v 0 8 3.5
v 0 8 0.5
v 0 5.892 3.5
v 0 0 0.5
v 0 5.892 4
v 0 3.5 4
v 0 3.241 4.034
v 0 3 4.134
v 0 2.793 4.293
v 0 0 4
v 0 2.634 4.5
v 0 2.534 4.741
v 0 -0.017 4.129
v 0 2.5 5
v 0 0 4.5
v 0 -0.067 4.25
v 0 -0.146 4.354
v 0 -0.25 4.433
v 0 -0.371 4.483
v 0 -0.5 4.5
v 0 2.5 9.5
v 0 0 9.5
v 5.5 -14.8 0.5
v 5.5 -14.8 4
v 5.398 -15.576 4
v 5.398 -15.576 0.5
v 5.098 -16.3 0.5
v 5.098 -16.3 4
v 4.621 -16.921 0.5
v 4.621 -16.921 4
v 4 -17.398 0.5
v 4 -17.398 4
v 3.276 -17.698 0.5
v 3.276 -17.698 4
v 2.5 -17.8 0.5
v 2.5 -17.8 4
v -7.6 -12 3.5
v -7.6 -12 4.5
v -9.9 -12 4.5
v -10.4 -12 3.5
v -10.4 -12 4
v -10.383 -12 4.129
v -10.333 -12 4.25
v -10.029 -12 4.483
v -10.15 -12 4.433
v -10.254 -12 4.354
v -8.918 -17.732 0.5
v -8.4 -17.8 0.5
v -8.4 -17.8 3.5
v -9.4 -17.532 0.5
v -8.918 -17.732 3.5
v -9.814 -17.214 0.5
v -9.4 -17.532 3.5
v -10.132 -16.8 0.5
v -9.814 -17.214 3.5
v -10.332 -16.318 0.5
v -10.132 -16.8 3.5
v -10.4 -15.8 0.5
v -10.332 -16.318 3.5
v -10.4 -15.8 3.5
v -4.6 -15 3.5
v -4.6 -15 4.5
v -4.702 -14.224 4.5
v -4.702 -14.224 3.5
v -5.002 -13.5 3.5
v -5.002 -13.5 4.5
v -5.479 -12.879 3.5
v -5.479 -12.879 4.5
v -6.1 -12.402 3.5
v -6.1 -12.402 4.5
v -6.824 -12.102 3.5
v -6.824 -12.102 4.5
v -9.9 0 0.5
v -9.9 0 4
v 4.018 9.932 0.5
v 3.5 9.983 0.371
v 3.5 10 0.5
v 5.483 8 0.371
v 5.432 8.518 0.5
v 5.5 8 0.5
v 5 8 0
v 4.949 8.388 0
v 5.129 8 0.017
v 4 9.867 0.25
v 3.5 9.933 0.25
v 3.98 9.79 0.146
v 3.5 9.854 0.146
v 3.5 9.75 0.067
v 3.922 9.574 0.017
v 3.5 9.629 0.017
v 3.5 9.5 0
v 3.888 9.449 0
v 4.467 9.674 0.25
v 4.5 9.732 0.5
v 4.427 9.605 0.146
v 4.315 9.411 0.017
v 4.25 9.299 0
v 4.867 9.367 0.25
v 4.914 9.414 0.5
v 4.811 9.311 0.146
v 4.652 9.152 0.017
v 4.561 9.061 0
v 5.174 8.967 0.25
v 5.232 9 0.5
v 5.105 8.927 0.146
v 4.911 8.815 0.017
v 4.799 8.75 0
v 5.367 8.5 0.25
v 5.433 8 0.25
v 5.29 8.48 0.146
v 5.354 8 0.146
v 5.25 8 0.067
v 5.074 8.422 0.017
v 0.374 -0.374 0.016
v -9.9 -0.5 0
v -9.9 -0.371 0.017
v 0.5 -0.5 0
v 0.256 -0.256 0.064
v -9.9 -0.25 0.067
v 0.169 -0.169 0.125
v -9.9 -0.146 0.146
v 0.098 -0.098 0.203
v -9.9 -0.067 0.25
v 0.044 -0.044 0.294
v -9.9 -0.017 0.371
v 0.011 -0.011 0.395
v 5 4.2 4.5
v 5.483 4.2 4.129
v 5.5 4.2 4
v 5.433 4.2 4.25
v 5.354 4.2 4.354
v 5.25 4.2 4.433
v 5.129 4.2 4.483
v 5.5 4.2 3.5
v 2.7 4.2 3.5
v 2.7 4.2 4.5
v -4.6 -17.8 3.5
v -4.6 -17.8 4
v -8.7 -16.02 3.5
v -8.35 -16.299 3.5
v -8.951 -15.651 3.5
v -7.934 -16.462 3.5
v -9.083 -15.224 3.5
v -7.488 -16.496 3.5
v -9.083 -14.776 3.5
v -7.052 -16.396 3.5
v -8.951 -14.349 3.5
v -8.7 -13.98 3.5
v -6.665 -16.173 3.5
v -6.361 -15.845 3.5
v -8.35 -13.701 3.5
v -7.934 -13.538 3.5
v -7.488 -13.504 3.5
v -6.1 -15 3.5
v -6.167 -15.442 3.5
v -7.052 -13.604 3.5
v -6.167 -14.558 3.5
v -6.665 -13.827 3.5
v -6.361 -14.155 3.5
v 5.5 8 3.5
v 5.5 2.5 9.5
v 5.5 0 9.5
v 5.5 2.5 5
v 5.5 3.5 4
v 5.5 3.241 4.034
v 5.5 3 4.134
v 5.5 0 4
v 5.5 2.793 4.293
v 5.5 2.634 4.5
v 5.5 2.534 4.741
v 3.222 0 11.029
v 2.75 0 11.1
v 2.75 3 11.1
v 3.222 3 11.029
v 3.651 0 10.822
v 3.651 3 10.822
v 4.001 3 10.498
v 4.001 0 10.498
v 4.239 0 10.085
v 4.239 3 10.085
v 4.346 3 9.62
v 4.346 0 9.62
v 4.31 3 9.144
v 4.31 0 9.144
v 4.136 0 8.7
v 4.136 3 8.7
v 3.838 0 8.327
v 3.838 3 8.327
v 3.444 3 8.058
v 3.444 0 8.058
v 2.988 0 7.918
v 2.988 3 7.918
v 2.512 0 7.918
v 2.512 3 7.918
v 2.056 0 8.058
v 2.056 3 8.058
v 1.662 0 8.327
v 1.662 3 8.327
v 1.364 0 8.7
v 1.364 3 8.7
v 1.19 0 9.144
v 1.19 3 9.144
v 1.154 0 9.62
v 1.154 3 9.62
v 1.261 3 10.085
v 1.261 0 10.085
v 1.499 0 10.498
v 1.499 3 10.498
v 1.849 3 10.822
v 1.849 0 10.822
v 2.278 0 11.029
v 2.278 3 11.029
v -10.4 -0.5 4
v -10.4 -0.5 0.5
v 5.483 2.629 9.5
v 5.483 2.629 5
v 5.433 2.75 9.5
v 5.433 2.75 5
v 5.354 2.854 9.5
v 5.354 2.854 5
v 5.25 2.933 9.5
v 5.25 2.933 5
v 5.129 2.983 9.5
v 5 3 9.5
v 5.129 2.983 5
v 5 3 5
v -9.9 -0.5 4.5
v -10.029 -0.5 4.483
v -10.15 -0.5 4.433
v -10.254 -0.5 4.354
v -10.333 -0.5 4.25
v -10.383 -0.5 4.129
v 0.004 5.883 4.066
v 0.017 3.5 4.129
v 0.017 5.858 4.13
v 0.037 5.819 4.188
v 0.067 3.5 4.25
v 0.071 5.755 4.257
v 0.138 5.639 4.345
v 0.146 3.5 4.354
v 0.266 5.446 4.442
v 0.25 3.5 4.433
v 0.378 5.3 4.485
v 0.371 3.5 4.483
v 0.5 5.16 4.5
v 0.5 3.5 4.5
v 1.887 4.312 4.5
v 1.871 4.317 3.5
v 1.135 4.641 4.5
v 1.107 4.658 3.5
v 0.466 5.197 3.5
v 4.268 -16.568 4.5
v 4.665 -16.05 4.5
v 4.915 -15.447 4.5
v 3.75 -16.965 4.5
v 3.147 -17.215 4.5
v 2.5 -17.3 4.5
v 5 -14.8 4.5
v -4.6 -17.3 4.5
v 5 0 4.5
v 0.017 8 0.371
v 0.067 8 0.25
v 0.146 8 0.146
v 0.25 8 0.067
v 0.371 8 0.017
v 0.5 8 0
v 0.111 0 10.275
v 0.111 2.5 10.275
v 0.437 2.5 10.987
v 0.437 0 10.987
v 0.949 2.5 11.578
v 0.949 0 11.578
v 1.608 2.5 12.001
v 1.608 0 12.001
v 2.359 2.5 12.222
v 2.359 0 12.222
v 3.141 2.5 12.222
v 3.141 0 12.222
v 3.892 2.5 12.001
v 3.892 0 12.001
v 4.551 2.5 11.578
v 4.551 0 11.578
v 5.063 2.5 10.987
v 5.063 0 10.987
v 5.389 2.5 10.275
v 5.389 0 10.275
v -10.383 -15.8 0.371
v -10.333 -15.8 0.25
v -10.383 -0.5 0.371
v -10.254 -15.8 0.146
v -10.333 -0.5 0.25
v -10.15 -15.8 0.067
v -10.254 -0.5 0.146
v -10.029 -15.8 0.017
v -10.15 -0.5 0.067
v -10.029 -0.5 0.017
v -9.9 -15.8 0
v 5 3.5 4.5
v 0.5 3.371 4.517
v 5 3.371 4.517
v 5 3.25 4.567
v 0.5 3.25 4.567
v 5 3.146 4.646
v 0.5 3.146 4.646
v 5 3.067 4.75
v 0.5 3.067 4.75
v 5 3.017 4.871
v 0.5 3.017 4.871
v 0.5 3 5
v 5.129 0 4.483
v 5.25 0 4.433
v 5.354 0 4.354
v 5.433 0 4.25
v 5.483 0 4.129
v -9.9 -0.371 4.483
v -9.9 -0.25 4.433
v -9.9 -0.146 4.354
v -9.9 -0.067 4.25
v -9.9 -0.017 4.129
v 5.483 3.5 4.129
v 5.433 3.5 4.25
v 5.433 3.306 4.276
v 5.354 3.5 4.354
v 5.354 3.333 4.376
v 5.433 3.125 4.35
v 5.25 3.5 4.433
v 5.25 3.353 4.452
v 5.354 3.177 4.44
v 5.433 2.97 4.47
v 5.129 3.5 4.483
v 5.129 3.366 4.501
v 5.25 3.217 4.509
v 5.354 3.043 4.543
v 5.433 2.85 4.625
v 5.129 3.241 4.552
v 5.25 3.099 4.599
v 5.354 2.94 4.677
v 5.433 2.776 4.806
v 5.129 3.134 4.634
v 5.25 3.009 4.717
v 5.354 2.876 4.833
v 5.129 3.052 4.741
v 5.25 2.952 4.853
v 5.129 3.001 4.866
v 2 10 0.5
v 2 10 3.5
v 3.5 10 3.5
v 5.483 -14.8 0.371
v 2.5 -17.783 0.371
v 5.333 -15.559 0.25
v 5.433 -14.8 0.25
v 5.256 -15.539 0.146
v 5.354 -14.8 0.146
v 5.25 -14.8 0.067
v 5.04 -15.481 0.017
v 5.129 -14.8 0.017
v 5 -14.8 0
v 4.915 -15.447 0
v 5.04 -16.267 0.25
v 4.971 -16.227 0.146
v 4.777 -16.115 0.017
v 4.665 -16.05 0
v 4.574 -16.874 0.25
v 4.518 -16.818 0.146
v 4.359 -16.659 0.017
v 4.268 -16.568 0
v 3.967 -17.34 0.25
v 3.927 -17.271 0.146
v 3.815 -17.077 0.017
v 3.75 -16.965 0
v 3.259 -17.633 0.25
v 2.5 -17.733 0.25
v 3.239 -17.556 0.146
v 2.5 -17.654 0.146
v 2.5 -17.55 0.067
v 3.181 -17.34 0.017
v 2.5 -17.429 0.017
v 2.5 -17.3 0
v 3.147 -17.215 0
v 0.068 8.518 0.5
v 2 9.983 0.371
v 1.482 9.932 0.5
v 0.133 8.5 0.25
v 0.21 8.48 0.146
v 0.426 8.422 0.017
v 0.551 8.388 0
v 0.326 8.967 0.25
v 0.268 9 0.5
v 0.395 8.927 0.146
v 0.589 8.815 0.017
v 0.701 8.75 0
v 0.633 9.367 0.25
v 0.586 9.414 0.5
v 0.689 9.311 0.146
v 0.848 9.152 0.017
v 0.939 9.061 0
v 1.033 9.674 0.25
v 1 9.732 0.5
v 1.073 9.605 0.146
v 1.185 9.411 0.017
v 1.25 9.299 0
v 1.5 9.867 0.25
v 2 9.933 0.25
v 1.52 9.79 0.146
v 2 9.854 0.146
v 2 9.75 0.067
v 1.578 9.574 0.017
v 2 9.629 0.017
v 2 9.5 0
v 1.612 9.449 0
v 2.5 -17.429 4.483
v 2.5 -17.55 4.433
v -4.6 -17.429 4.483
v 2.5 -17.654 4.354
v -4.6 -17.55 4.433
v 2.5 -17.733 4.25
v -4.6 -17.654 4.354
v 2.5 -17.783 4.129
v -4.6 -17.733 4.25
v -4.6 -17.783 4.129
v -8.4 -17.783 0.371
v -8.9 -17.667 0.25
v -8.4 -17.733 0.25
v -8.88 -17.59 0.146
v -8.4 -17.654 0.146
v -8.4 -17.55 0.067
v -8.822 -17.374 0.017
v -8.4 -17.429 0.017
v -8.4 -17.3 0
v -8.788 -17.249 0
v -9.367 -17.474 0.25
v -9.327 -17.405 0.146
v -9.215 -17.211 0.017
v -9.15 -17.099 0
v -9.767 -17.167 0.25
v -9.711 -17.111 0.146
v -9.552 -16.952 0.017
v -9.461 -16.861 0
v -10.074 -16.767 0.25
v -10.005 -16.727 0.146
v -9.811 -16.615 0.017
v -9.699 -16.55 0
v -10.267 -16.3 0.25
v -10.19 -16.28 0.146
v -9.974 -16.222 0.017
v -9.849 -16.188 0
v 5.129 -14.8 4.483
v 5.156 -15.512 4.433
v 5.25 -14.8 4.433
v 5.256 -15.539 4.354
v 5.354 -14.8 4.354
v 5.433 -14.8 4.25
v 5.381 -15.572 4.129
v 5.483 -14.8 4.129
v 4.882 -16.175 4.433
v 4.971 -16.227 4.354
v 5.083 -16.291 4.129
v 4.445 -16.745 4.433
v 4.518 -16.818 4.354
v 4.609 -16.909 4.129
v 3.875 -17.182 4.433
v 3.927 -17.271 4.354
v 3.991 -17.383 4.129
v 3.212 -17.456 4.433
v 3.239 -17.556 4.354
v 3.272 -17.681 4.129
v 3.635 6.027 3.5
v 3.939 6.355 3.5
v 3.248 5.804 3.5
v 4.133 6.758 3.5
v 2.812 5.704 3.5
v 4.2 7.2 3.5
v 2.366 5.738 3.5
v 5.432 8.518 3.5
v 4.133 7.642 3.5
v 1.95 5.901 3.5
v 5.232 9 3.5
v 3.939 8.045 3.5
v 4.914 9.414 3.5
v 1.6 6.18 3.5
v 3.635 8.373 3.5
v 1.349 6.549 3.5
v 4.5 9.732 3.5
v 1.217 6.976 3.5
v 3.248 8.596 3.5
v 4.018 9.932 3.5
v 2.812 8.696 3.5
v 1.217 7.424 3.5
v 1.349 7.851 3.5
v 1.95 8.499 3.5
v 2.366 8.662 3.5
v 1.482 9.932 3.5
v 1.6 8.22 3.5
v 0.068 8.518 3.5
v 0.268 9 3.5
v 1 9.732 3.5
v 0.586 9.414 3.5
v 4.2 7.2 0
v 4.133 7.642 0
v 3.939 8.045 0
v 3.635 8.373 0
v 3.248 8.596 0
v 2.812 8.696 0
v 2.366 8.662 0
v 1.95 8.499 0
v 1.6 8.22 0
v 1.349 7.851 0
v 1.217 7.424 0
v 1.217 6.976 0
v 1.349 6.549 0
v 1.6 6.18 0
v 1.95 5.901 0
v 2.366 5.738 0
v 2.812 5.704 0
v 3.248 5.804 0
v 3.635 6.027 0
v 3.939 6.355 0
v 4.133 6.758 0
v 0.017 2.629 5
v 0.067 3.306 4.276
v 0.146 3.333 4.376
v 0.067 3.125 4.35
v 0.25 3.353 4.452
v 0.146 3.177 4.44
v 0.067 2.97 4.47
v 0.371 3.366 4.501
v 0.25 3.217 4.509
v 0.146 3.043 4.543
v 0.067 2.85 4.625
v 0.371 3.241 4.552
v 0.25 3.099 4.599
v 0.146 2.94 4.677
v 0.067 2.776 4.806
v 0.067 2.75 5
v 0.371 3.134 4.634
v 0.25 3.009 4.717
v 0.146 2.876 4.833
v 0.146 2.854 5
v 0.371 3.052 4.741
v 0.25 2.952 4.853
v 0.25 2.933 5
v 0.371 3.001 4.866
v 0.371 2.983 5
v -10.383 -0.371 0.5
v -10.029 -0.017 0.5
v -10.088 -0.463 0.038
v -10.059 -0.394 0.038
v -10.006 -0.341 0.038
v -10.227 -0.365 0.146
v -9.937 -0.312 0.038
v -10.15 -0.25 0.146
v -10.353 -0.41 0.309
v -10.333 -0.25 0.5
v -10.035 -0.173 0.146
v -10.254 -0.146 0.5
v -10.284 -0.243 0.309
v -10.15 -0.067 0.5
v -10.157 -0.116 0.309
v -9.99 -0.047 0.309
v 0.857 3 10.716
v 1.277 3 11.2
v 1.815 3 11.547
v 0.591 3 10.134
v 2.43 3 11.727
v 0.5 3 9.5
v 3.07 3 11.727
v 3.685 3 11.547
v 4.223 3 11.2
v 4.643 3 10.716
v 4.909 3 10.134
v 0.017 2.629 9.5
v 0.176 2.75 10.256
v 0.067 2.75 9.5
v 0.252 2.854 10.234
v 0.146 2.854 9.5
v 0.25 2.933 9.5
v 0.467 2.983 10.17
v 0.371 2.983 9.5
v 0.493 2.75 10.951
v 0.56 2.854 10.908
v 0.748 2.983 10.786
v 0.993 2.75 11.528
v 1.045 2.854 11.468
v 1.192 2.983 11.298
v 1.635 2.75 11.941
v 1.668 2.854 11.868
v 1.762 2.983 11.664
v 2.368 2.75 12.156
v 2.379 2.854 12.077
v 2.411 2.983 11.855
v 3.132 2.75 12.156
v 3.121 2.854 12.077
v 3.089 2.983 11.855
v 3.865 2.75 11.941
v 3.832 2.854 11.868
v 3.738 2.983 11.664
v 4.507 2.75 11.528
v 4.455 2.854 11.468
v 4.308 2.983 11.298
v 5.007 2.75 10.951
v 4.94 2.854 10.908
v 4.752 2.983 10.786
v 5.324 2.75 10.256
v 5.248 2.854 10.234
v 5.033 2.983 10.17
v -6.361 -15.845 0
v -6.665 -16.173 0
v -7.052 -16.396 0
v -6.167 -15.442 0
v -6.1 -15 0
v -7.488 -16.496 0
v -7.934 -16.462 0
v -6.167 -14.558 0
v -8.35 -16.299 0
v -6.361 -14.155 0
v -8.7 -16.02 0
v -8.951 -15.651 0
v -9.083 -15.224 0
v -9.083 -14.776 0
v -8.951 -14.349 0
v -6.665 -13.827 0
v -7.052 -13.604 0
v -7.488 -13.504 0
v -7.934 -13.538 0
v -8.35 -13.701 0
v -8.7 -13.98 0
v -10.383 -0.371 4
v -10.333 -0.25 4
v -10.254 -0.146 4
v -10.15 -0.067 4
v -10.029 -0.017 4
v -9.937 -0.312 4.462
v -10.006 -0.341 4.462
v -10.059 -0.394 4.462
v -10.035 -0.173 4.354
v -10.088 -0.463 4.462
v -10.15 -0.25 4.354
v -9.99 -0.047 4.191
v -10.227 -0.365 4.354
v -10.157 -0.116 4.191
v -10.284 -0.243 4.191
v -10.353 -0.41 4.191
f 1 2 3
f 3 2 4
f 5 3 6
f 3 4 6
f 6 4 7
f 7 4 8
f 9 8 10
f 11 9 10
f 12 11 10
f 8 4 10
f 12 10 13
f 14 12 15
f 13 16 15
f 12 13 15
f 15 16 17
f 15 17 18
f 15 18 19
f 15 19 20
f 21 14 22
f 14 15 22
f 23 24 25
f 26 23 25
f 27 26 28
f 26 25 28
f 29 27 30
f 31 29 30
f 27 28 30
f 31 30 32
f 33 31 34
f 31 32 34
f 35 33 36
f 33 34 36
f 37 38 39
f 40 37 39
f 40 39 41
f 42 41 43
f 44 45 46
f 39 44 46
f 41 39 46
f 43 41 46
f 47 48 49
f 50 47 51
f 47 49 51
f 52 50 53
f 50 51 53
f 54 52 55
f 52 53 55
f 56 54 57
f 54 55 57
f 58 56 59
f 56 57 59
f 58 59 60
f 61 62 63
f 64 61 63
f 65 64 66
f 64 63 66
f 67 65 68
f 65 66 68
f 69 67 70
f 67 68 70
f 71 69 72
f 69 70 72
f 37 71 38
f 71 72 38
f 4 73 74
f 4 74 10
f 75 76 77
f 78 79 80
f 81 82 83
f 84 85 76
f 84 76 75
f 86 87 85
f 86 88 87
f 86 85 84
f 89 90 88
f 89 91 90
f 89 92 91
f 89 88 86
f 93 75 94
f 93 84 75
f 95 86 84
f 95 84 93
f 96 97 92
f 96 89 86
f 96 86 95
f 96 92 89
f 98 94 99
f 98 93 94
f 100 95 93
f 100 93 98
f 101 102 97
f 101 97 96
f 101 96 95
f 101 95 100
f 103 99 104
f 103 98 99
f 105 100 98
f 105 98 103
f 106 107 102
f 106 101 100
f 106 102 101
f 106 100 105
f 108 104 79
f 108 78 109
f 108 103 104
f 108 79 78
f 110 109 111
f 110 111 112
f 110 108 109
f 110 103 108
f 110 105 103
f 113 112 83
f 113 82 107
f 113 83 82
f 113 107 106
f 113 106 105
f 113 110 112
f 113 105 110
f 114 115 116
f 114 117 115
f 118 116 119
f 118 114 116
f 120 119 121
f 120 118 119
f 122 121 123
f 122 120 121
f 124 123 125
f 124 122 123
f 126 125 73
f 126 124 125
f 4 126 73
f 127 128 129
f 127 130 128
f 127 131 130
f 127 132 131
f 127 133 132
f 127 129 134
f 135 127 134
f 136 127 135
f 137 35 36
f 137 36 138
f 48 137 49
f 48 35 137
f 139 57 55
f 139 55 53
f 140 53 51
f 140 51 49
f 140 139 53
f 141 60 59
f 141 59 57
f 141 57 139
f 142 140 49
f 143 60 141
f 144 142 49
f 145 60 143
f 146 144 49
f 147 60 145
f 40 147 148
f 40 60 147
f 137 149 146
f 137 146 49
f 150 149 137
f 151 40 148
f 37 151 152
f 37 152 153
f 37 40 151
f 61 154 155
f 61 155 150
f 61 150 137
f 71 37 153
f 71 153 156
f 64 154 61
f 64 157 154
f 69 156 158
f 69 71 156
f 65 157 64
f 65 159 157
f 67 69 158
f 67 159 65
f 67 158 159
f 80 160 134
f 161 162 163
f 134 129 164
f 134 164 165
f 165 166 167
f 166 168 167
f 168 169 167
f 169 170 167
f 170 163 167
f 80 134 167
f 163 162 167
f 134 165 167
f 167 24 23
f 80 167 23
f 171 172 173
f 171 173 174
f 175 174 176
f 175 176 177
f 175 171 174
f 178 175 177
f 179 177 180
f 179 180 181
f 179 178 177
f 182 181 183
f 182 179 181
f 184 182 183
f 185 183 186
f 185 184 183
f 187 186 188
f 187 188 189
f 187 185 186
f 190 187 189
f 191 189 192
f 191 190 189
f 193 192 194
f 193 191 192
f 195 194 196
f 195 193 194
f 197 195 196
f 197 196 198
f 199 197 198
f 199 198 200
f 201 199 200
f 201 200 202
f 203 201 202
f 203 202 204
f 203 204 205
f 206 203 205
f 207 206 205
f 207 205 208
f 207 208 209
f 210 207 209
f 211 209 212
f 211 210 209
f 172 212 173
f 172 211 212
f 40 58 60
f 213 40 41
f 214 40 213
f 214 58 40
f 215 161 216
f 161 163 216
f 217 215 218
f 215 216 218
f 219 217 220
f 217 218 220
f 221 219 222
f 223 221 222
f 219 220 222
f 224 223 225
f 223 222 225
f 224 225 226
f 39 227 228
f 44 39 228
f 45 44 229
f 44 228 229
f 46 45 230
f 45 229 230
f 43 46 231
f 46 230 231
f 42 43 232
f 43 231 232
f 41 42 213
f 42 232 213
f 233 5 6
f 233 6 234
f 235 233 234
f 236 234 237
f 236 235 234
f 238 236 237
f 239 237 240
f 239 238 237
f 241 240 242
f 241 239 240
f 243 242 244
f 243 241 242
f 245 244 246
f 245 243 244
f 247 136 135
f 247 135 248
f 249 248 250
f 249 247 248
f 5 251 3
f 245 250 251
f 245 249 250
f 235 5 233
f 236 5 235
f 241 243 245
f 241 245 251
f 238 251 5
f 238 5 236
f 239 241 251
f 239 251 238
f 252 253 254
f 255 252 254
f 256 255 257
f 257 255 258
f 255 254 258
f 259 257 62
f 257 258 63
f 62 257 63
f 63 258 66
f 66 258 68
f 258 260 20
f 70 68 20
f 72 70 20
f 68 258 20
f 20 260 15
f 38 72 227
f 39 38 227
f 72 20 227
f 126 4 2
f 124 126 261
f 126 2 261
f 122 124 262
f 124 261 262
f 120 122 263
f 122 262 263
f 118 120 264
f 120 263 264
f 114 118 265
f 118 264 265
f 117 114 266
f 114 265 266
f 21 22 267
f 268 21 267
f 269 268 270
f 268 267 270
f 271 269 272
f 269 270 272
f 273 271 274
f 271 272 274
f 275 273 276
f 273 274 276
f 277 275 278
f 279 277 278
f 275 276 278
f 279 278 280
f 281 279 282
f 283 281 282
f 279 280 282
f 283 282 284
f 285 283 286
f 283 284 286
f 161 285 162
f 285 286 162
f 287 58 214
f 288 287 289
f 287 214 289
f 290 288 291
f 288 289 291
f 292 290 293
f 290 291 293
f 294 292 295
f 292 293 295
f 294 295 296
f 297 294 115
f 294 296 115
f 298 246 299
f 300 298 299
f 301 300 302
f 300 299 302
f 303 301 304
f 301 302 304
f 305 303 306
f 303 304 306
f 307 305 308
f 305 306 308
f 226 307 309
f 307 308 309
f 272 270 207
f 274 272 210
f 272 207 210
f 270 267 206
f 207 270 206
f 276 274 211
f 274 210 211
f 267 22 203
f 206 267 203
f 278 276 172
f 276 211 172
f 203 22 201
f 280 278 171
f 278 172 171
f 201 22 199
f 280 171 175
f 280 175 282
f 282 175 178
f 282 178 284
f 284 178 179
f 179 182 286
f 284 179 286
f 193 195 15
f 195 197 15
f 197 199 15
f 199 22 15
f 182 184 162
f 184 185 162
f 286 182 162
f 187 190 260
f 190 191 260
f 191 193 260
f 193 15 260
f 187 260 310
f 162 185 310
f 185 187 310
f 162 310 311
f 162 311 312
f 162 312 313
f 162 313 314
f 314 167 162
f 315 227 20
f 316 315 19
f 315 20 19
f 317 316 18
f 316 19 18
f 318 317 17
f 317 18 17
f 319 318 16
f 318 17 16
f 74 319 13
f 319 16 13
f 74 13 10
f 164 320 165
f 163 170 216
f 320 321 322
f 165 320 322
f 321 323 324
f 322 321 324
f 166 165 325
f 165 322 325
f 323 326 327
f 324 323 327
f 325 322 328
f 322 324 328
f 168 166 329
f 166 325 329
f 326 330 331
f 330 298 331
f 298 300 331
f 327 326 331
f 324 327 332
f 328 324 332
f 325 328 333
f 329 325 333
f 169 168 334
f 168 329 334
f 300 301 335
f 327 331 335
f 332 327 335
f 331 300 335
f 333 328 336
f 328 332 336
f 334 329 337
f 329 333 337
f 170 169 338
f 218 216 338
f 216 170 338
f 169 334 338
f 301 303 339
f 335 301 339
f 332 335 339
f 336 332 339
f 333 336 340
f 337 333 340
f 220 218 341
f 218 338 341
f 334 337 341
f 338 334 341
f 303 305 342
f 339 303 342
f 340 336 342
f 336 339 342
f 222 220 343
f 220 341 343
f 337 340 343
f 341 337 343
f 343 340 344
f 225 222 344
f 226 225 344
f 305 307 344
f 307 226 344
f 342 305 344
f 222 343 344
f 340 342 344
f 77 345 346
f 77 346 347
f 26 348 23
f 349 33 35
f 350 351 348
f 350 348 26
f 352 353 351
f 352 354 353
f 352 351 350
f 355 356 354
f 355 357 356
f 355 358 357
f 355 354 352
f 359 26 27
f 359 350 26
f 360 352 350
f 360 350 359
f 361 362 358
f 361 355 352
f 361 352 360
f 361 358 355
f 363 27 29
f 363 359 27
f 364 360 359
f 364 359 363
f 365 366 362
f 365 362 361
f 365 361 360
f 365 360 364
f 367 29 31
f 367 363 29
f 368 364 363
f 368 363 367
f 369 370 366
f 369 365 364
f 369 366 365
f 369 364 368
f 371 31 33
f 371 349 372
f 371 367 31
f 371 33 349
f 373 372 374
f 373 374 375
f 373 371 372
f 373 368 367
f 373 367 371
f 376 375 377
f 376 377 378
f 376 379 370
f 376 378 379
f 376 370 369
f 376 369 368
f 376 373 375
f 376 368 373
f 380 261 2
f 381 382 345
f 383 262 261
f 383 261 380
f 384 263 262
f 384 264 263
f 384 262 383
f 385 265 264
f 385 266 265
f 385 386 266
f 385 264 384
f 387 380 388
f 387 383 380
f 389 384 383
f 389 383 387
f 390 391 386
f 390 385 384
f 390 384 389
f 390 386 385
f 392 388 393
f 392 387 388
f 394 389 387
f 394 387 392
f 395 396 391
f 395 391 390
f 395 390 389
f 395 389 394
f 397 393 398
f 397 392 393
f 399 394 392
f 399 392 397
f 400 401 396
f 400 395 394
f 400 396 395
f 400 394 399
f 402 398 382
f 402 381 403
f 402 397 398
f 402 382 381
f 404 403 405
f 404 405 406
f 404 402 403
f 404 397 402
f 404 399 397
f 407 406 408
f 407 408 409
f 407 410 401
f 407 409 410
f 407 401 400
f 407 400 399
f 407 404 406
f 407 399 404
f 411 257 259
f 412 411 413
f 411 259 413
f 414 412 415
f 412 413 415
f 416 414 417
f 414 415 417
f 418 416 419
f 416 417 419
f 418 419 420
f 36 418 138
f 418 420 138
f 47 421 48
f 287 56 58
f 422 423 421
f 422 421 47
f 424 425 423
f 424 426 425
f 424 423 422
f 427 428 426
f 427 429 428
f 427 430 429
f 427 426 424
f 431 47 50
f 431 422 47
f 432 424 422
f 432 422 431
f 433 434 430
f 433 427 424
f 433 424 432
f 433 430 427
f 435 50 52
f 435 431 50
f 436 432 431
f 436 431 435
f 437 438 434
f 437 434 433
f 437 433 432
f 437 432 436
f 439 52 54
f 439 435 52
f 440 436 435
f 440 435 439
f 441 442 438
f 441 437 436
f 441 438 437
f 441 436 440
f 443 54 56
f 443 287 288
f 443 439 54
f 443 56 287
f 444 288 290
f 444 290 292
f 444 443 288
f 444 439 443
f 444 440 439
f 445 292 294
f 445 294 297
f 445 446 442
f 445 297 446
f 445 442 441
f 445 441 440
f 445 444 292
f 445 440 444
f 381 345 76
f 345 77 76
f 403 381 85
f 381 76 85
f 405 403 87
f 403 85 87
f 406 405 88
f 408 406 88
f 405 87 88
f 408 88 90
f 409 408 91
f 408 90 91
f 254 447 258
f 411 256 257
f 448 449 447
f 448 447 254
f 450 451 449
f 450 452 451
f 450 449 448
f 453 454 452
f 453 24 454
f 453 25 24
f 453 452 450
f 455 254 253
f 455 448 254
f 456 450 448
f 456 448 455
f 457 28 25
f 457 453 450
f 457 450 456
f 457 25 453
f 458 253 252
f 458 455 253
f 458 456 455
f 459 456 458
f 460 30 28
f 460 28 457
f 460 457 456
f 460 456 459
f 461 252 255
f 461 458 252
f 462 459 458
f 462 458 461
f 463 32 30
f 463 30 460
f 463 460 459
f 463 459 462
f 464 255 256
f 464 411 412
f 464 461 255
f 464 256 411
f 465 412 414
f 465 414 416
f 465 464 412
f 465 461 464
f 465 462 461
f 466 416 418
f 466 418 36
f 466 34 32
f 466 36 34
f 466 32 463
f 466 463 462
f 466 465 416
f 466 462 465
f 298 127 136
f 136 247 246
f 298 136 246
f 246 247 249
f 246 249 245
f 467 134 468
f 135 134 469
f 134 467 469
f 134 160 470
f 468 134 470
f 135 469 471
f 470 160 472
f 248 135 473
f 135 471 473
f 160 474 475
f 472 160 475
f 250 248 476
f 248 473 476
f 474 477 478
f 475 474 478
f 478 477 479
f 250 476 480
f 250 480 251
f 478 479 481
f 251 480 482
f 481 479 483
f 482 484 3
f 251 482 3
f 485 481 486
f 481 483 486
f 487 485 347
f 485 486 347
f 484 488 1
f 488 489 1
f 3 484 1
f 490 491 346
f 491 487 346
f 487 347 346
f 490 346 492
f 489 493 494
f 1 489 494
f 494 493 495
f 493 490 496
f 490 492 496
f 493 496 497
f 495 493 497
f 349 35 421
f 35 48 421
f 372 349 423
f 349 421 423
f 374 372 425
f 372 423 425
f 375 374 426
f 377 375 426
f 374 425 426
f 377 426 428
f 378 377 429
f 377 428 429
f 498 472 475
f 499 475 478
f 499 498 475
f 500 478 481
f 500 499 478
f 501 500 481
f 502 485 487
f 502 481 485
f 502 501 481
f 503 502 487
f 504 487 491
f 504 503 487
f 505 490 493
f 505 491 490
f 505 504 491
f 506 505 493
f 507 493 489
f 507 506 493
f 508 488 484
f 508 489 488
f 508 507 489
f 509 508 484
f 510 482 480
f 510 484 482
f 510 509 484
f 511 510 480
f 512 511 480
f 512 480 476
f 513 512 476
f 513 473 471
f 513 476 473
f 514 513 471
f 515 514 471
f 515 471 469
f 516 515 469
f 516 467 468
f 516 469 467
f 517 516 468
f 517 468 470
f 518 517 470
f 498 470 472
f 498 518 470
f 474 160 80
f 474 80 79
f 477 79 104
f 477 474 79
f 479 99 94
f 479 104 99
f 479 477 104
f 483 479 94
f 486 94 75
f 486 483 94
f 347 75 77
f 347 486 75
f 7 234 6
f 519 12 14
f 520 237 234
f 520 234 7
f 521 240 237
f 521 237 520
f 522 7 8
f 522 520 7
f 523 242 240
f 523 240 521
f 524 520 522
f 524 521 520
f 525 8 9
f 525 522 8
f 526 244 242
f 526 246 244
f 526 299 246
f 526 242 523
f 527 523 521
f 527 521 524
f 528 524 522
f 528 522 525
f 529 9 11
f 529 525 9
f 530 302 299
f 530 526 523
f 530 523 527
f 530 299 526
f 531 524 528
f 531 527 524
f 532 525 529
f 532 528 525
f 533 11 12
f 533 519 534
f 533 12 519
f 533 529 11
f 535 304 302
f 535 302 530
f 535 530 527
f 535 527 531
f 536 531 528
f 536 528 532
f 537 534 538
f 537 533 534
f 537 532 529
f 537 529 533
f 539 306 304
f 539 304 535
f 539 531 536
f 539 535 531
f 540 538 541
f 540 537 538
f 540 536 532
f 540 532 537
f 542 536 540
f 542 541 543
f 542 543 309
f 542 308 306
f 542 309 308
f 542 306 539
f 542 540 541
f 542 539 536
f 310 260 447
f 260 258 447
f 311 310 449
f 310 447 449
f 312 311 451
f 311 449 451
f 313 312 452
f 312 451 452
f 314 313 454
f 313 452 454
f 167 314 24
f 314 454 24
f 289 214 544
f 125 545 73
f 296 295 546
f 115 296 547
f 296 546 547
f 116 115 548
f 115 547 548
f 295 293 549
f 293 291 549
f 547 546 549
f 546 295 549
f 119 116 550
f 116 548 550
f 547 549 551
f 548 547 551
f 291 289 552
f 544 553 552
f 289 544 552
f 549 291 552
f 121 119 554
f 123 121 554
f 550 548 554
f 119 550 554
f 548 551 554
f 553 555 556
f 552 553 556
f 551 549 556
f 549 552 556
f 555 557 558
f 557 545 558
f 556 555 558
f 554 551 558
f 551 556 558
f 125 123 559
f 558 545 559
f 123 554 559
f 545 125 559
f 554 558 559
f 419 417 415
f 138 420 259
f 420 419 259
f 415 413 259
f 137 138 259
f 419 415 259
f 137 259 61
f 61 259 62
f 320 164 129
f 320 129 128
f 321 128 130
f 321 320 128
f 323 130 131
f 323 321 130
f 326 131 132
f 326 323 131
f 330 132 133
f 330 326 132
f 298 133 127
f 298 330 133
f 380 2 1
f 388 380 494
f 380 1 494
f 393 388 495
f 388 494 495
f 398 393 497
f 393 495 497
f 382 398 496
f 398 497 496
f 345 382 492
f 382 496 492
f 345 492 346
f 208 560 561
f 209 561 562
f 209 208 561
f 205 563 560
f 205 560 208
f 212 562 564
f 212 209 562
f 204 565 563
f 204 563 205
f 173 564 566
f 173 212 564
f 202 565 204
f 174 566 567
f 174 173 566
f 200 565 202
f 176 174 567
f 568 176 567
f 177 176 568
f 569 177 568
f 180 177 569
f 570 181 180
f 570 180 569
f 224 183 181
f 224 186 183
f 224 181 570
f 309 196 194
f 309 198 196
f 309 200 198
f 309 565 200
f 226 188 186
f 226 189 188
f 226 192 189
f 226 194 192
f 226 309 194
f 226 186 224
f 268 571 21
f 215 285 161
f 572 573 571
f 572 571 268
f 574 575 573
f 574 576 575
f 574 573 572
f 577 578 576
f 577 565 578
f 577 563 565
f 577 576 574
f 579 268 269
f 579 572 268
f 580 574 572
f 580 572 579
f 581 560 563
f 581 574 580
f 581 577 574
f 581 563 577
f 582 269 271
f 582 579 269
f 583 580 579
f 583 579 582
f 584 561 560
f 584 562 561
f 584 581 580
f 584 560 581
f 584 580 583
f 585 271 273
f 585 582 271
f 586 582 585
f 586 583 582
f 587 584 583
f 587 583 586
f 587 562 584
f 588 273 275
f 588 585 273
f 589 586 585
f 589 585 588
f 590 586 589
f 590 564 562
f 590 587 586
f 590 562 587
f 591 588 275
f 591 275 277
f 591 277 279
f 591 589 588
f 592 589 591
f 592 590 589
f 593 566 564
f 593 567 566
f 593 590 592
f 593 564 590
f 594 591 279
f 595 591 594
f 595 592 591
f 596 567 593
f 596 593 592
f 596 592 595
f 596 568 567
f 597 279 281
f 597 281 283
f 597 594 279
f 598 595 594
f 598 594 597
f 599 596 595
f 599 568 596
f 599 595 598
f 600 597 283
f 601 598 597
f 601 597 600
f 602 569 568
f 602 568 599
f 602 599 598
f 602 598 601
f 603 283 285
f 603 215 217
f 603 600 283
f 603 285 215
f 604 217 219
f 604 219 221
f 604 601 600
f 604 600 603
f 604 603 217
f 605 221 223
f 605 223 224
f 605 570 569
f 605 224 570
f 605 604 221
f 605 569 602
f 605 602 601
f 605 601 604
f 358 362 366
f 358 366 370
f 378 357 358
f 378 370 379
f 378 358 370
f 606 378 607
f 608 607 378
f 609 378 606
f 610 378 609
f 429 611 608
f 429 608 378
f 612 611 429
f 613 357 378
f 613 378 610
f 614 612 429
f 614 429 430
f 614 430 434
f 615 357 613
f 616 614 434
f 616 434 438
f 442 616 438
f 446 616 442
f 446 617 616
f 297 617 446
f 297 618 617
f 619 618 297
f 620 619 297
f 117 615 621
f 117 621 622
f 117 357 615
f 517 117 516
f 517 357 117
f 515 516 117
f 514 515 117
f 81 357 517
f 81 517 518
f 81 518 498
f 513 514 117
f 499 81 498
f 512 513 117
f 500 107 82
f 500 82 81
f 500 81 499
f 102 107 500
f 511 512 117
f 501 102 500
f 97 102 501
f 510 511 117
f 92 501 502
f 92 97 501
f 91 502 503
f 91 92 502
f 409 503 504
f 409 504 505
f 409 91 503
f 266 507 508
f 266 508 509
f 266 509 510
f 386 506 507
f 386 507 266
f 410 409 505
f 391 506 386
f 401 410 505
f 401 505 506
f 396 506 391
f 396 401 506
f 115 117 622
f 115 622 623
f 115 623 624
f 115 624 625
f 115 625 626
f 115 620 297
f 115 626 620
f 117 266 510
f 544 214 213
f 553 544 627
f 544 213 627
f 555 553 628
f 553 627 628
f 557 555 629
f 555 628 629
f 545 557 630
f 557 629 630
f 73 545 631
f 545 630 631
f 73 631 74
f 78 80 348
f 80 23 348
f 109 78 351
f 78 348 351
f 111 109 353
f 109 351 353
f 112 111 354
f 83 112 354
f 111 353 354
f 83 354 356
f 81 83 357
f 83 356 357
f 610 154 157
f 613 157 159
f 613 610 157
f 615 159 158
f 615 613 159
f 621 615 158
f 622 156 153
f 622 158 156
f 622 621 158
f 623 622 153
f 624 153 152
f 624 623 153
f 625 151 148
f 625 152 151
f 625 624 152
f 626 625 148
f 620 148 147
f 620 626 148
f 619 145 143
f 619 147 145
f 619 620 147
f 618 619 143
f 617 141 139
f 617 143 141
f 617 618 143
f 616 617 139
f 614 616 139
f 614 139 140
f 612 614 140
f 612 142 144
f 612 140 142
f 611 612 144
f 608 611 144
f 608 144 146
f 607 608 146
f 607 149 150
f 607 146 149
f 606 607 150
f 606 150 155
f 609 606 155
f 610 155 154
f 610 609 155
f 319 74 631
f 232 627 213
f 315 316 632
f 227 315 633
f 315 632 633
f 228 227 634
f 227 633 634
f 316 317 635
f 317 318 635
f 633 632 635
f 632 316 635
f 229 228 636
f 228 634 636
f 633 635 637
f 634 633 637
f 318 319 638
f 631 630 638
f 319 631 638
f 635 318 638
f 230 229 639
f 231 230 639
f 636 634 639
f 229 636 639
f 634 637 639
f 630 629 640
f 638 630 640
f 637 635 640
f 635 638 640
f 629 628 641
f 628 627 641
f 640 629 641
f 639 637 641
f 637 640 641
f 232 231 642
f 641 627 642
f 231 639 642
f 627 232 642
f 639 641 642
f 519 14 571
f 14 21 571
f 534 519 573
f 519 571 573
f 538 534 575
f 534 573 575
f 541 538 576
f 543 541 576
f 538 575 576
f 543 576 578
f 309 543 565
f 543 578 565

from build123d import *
from OCP.BRepFilletAPI import BRepFilletAPI_MakeFillet

# Parameters (mm, degrees)
SKETCH1_R           = 1.5
BOSS_EXTRUDE1_DEPTH = 4.5
SKETCH3_R           = 1.6
BOSS_EXTRUDE2_DEPTH = 3
FILLET1_R1          = 2
FILLET1_R2          = 3
FILLET2_R           = 0.5
CUT_EXTRUDE1_DEPTH  = 1


with BuildPart() as part:
    # Sketch1 → Boss-Extrude1 (new body)
    with BuildSketch(Plane.XY):
        Polygon((-10.4, 0), (0, 0), (0, 10), (5.5, 10), (5.5, -17.8), (-10.4, -17.8), align=None)
        with Locations((2.7, 7.2)):
            Circle(SKETCH1_R, mode=Mode.SUBTRACT)
        with Locations((-7.6, -15)):
            Circle(SKETCH1_R, mode=Mode.SUBTRACT)
    extrude(amount=BOSS_EXTRUDE1_DEPTH)

    # Sketch3 → Boss-Extrude2 (add)
    with BuildSketch(Plane(origin=(0, 0, 0), x_dir=(1, 0, 0), z_dir=(0, 1, 0))):
        with BuildLine():
            Line((5.5, -4.5), (0, -4.5))
            Line((0, -4.5), (0, -9.5))
            ThreePointArc((0, -9.5), (2.75, -12.25), (5.5, -9.5))
            Line((5.5, -9.5), (5.5, -4.5))
        make_face()
        with Locations((2.75, -9.5)):
            Circle(SKETCH3_R, mode=Mode.SUBTRACT)
    extrude(amount=BOSS_EXTRUDE2_DEPTH)

    # Fillet1: one fillet with a radius per group of edges: ONE call of the kernel's fillet builder (fillet() takes one radius for all edges)
    fillet1_edges_1 = [part.edges().sort_by_distance(p)[0] for p in [
        (-10.4, -17.8, 2.25),
        (5.5, 10, 2.25),
        (0, 10, 2.25),
    ]]
    fillet1_edges_2 = [part.edges().sort_by_distance(p)[0] for p in [
        (5.5, -17.8, 2.25),
    ]]
    fillet1 = BRepFilletAPI_MakeFillet(part.part.solid().wrapped)
    for e in fillet1_edges_1:
        fillet1.Add(FILLET1_R1, e.wrapped)
    for e in fillet1_edges_2:
        fillet1.Add(FILLET1_R2, e.wrapped)
    add(Compound.cast(fillet1.Shape()), mode=Mode.REPLACE)

    # Fillet2
    fillet2_edges = [part.edges().sort_by_distance(p)[0] for p in [
        (2.75, 3, 12.25),
        (5.5, 3, 7),
        (0, 3, 7),
        (0.585786438, 9.414213562, 0),
        (4.914213562, 9.414213562, 0),
        (2.75, 10, 0),
        (4.914213562, 9.414213562, 4.5),
        (0.585786438, 9.414213562, 4.5),
        (2.75, 10, 4.5),
        (0, 5.5, 4.5),
        (5.5, 5.5, 4.5),
        (2.75, 3, 4.5),
        (4.621320344, -16.921320344, 0),
        (5.5, -3.4, 0),
        (-9.814213562, -17.214213562, 0),
        (-2.95, -17.8, 0),
        (0, 4, 0),
        (-5.2, 0, 0),
        (-10.4, -7.9, 0),
        (-10.4, 0, 2.25),
        (-5.2, 0, 4.5),
        (4.621320344, -16.921320344, 4.5),
        (-9.814213562, -17.214213562, 4.5),
        (5.5, -7.4, 4.5),
        (-2.95, -17.8, 4.5),
        (-10.4, -7.9, 4.5),
    ]]
    fillet(fillet2_edges, radius=FILLET2_R)

    # Sketch6 → Cut-Extrude1 (cut)
    with BuildSketch(Plane.XY.offset(4.5)):
        with BuildLine():
            Line((-0.3, 7.2), (-0.3, 10))
            Line((-0.3, 10), (5.5, 10))
            Line((5.5, 10), (5.5, 4.2))
            Line((5.5, 4.2), (2.7, 4.2))
            ThreePointArc((2.7, 4.2), (0.578679656, 5.078679656), (-0.3, 7.2))
        make_face()
        with BuildLine():
            Line((-7.6, -12), (-10.4, -12))
            Line((-10.4, -12), (-10.4, -17.8))
            Line((-10.4, -17.8), (-4.6, -17.8))
            Line((-4.6, -17.8), (-4.6, -15))
            ThreePointArc((-4.6, -15), (-5.478679656, -12.878679656), (-7.6, -12))
        make_face()
    extrude(amount=-CUT_EXTRUDE1_DEPTH, mode=Mode.SUBTRACT)


solid = part.part
